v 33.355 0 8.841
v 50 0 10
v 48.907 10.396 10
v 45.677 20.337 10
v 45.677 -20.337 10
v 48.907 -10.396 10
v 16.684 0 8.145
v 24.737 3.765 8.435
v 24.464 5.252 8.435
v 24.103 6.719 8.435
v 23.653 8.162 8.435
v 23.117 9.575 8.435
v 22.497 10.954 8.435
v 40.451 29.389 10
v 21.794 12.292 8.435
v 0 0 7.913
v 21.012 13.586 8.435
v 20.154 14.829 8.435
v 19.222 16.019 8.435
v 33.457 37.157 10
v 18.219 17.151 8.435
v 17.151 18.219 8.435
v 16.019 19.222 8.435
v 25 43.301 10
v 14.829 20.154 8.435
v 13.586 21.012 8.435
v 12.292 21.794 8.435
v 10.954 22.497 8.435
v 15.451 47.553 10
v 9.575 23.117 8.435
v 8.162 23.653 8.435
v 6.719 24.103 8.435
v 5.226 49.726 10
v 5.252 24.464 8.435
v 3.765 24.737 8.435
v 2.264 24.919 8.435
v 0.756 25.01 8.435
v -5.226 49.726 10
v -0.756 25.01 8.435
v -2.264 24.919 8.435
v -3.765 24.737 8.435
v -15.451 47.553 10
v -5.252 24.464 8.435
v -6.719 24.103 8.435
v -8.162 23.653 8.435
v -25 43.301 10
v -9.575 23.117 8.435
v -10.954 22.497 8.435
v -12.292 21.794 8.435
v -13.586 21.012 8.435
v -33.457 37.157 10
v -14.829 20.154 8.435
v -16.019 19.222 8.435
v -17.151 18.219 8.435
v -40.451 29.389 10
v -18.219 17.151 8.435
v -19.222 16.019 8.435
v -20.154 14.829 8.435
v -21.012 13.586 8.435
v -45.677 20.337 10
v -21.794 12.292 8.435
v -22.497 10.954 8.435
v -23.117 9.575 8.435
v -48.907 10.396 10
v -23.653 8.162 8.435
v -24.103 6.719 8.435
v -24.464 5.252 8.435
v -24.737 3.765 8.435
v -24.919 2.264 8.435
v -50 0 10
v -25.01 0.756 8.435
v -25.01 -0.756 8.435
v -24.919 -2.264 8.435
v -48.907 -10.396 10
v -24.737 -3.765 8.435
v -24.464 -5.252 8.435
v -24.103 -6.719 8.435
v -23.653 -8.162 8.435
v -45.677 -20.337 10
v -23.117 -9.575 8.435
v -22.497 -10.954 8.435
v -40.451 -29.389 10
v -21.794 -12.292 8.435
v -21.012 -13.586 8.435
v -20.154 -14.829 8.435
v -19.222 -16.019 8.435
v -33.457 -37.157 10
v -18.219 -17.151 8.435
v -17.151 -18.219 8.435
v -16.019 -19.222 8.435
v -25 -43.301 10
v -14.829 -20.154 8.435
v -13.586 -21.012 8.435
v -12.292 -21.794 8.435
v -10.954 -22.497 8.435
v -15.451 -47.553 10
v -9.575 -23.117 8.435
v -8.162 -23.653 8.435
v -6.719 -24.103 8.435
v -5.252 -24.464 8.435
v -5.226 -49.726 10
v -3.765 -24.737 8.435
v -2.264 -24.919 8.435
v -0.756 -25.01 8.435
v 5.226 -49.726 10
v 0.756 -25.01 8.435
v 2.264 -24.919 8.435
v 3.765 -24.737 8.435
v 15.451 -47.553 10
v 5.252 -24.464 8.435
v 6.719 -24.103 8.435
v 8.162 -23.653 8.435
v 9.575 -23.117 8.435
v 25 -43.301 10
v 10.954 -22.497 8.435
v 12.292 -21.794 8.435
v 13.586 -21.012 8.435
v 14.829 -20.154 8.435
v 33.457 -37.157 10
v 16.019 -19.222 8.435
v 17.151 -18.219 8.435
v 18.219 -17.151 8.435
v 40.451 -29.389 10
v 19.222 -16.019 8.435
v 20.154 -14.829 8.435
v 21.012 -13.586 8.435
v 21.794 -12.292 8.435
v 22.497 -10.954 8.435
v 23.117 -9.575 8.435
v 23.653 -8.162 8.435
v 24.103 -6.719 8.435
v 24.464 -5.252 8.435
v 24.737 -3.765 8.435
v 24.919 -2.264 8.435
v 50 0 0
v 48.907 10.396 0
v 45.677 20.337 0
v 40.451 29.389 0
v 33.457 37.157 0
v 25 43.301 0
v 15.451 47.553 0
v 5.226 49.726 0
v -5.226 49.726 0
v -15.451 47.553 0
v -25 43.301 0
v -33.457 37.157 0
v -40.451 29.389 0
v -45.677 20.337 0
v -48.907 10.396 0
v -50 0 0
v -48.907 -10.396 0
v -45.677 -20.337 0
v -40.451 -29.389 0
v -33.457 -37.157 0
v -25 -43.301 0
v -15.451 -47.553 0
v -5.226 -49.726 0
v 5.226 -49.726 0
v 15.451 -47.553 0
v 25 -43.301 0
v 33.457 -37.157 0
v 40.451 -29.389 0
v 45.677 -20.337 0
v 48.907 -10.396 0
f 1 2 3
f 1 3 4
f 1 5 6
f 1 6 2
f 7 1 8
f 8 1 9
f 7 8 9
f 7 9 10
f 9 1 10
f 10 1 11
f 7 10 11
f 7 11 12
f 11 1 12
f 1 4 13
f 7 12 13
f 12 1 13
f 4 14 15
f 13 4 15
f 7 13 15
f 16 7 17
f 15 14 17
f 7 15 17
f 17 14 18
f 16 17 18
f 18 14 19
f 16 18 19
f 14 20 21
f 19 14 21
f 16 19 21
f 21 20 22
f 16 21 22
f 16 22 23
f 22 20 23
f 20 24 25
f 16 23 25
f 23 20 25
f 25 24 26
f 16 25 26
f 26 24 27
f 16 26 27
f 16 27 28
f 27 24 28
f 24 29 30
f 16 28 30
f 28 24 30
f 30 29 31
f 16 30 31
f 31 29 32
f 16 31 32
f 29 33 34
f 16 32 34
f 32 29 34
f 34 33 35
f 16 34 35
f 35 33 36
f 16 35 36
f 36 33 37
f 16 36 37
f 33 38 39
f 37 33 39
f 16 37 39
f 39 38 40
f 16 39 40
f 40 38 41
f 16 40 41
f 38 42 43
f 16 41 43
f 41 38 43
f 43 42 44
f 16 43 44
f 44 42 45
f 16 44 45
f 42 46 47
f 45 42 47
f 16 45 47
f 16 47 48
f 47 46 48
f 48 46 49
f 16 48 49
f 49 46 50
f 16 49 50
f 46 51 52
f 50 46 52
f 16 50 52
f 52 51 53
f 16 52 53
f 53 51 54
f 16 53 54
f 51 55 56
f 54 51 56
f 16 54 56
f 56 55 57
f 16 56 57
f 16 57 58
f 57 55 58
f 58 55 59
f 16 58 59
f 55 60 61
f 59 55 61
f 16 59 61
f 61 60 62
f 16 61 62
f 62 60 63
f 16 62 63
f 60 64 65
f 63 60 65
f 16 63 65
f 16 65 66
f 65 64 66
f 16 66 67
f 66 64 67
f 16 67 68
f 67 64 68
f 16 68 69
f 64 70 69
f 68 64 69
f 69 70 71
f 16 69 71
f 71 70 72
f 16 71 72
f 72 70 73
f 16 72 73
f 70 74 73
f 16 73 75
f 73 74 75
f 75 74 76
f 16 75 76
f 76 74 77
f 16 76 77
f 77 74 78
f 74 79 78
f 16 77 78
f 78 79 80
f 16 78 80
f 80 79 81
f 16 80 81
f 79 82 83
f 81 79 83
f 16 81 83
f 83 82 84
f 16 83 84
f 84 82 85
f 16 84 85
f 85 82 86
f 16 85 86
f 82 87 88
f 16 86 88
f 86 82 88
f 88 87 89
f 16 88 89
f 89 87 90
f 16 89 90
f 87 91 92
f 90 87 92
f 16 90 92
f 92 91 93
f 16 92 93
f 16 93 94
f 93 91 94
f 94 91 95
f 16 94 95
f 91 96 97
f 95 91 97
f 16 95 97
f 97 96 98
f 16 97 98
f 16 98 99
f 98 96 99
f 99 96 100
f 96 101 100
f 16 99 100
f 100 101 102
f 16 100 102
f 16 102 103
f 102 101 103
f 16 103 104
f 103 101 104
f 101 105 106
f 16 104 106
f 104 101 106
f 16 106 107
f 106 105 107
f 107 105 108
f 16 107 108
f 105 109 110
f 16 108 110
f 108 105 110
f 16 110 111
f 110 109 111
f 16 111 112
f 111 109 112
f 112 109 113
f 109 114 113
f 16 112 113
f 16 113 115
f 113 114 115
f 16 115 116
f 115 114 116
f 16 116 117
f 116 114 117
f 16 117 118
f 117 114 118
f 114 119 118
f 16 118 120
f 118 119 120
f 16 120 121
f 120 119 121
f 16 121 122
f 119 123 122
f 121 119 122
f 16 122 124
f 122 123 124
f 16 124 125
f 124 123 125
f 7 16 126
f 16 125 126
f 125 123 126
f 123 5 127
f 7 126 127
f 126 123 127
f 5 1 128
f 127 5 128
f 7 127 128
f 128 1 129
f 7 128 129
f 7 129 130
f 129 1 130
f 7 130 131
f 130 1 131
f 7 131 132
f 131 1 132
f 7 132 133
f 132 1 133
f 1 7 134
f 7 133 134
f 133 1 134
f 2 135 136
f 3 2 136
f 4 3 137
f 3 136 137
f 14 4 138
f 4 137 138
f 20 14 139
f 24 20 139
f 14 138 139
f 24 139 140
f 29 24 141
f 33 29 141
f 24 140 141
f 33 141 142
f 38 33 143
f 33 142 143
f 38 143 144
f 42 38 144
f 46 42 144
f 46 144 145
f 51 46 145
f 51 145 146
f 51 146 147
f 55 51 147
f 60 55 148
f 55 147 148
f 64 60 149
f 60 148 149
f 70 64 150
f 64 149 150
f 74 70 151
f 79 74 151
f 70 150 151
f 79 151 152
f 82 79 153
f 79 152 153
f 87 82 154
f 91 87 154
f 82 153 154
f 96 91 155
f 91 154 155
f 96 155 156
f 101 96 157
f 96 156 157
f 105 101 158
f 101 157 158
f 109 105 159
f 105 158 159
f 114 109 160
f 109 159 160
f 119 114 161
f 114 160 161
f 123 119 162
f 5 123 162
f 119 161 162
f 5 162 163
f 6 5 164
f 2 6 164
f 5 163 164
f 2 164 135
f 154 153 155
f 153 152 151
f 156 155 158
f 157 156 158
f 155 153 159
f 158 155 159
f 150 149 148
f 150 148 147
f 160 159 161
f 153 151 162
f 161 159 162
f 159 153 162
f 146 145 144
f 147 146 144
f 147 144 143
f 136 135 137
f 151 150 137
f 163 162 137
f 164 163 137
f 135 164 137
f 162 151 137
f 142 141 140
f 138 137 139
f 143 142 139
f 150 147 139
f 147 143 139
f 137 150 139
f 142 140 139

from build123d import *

# Parameters (mm, degrees)
CYLINDER001_R     = 50
CYLINDER001_DEPTH = 10


with BuildPart() as sphere001:
    # Sphere001 → Sphere001 (revolve)
    with BuildSketch(Plane(origin=(0, 0, 607.913037), x_dir=(1, 0, 0), z_dir=(0, -1, 0))):
        with BuildLine():
            ThreePointArc((0, -600), (600, 0), (0, 600))
            Line((0, 600), (0, -600))
        make_face()
    revolve(axis=Axis((0, 0, 607.913037), (0, 0, 1)))


with BuildPart() as concavemirror:
    # Cylinder001 → Cylinder001 (new body)
    with BuildSketch(Plane.XY):
        Circle(CYLINDER001_R)
    extrude(amount=CYLINDER001_DEPTH)

    # Cut001: cut Sphere001
    add(sphere001.part, mode=Mode.SUBTRACT)


solid = concavemirror.part
